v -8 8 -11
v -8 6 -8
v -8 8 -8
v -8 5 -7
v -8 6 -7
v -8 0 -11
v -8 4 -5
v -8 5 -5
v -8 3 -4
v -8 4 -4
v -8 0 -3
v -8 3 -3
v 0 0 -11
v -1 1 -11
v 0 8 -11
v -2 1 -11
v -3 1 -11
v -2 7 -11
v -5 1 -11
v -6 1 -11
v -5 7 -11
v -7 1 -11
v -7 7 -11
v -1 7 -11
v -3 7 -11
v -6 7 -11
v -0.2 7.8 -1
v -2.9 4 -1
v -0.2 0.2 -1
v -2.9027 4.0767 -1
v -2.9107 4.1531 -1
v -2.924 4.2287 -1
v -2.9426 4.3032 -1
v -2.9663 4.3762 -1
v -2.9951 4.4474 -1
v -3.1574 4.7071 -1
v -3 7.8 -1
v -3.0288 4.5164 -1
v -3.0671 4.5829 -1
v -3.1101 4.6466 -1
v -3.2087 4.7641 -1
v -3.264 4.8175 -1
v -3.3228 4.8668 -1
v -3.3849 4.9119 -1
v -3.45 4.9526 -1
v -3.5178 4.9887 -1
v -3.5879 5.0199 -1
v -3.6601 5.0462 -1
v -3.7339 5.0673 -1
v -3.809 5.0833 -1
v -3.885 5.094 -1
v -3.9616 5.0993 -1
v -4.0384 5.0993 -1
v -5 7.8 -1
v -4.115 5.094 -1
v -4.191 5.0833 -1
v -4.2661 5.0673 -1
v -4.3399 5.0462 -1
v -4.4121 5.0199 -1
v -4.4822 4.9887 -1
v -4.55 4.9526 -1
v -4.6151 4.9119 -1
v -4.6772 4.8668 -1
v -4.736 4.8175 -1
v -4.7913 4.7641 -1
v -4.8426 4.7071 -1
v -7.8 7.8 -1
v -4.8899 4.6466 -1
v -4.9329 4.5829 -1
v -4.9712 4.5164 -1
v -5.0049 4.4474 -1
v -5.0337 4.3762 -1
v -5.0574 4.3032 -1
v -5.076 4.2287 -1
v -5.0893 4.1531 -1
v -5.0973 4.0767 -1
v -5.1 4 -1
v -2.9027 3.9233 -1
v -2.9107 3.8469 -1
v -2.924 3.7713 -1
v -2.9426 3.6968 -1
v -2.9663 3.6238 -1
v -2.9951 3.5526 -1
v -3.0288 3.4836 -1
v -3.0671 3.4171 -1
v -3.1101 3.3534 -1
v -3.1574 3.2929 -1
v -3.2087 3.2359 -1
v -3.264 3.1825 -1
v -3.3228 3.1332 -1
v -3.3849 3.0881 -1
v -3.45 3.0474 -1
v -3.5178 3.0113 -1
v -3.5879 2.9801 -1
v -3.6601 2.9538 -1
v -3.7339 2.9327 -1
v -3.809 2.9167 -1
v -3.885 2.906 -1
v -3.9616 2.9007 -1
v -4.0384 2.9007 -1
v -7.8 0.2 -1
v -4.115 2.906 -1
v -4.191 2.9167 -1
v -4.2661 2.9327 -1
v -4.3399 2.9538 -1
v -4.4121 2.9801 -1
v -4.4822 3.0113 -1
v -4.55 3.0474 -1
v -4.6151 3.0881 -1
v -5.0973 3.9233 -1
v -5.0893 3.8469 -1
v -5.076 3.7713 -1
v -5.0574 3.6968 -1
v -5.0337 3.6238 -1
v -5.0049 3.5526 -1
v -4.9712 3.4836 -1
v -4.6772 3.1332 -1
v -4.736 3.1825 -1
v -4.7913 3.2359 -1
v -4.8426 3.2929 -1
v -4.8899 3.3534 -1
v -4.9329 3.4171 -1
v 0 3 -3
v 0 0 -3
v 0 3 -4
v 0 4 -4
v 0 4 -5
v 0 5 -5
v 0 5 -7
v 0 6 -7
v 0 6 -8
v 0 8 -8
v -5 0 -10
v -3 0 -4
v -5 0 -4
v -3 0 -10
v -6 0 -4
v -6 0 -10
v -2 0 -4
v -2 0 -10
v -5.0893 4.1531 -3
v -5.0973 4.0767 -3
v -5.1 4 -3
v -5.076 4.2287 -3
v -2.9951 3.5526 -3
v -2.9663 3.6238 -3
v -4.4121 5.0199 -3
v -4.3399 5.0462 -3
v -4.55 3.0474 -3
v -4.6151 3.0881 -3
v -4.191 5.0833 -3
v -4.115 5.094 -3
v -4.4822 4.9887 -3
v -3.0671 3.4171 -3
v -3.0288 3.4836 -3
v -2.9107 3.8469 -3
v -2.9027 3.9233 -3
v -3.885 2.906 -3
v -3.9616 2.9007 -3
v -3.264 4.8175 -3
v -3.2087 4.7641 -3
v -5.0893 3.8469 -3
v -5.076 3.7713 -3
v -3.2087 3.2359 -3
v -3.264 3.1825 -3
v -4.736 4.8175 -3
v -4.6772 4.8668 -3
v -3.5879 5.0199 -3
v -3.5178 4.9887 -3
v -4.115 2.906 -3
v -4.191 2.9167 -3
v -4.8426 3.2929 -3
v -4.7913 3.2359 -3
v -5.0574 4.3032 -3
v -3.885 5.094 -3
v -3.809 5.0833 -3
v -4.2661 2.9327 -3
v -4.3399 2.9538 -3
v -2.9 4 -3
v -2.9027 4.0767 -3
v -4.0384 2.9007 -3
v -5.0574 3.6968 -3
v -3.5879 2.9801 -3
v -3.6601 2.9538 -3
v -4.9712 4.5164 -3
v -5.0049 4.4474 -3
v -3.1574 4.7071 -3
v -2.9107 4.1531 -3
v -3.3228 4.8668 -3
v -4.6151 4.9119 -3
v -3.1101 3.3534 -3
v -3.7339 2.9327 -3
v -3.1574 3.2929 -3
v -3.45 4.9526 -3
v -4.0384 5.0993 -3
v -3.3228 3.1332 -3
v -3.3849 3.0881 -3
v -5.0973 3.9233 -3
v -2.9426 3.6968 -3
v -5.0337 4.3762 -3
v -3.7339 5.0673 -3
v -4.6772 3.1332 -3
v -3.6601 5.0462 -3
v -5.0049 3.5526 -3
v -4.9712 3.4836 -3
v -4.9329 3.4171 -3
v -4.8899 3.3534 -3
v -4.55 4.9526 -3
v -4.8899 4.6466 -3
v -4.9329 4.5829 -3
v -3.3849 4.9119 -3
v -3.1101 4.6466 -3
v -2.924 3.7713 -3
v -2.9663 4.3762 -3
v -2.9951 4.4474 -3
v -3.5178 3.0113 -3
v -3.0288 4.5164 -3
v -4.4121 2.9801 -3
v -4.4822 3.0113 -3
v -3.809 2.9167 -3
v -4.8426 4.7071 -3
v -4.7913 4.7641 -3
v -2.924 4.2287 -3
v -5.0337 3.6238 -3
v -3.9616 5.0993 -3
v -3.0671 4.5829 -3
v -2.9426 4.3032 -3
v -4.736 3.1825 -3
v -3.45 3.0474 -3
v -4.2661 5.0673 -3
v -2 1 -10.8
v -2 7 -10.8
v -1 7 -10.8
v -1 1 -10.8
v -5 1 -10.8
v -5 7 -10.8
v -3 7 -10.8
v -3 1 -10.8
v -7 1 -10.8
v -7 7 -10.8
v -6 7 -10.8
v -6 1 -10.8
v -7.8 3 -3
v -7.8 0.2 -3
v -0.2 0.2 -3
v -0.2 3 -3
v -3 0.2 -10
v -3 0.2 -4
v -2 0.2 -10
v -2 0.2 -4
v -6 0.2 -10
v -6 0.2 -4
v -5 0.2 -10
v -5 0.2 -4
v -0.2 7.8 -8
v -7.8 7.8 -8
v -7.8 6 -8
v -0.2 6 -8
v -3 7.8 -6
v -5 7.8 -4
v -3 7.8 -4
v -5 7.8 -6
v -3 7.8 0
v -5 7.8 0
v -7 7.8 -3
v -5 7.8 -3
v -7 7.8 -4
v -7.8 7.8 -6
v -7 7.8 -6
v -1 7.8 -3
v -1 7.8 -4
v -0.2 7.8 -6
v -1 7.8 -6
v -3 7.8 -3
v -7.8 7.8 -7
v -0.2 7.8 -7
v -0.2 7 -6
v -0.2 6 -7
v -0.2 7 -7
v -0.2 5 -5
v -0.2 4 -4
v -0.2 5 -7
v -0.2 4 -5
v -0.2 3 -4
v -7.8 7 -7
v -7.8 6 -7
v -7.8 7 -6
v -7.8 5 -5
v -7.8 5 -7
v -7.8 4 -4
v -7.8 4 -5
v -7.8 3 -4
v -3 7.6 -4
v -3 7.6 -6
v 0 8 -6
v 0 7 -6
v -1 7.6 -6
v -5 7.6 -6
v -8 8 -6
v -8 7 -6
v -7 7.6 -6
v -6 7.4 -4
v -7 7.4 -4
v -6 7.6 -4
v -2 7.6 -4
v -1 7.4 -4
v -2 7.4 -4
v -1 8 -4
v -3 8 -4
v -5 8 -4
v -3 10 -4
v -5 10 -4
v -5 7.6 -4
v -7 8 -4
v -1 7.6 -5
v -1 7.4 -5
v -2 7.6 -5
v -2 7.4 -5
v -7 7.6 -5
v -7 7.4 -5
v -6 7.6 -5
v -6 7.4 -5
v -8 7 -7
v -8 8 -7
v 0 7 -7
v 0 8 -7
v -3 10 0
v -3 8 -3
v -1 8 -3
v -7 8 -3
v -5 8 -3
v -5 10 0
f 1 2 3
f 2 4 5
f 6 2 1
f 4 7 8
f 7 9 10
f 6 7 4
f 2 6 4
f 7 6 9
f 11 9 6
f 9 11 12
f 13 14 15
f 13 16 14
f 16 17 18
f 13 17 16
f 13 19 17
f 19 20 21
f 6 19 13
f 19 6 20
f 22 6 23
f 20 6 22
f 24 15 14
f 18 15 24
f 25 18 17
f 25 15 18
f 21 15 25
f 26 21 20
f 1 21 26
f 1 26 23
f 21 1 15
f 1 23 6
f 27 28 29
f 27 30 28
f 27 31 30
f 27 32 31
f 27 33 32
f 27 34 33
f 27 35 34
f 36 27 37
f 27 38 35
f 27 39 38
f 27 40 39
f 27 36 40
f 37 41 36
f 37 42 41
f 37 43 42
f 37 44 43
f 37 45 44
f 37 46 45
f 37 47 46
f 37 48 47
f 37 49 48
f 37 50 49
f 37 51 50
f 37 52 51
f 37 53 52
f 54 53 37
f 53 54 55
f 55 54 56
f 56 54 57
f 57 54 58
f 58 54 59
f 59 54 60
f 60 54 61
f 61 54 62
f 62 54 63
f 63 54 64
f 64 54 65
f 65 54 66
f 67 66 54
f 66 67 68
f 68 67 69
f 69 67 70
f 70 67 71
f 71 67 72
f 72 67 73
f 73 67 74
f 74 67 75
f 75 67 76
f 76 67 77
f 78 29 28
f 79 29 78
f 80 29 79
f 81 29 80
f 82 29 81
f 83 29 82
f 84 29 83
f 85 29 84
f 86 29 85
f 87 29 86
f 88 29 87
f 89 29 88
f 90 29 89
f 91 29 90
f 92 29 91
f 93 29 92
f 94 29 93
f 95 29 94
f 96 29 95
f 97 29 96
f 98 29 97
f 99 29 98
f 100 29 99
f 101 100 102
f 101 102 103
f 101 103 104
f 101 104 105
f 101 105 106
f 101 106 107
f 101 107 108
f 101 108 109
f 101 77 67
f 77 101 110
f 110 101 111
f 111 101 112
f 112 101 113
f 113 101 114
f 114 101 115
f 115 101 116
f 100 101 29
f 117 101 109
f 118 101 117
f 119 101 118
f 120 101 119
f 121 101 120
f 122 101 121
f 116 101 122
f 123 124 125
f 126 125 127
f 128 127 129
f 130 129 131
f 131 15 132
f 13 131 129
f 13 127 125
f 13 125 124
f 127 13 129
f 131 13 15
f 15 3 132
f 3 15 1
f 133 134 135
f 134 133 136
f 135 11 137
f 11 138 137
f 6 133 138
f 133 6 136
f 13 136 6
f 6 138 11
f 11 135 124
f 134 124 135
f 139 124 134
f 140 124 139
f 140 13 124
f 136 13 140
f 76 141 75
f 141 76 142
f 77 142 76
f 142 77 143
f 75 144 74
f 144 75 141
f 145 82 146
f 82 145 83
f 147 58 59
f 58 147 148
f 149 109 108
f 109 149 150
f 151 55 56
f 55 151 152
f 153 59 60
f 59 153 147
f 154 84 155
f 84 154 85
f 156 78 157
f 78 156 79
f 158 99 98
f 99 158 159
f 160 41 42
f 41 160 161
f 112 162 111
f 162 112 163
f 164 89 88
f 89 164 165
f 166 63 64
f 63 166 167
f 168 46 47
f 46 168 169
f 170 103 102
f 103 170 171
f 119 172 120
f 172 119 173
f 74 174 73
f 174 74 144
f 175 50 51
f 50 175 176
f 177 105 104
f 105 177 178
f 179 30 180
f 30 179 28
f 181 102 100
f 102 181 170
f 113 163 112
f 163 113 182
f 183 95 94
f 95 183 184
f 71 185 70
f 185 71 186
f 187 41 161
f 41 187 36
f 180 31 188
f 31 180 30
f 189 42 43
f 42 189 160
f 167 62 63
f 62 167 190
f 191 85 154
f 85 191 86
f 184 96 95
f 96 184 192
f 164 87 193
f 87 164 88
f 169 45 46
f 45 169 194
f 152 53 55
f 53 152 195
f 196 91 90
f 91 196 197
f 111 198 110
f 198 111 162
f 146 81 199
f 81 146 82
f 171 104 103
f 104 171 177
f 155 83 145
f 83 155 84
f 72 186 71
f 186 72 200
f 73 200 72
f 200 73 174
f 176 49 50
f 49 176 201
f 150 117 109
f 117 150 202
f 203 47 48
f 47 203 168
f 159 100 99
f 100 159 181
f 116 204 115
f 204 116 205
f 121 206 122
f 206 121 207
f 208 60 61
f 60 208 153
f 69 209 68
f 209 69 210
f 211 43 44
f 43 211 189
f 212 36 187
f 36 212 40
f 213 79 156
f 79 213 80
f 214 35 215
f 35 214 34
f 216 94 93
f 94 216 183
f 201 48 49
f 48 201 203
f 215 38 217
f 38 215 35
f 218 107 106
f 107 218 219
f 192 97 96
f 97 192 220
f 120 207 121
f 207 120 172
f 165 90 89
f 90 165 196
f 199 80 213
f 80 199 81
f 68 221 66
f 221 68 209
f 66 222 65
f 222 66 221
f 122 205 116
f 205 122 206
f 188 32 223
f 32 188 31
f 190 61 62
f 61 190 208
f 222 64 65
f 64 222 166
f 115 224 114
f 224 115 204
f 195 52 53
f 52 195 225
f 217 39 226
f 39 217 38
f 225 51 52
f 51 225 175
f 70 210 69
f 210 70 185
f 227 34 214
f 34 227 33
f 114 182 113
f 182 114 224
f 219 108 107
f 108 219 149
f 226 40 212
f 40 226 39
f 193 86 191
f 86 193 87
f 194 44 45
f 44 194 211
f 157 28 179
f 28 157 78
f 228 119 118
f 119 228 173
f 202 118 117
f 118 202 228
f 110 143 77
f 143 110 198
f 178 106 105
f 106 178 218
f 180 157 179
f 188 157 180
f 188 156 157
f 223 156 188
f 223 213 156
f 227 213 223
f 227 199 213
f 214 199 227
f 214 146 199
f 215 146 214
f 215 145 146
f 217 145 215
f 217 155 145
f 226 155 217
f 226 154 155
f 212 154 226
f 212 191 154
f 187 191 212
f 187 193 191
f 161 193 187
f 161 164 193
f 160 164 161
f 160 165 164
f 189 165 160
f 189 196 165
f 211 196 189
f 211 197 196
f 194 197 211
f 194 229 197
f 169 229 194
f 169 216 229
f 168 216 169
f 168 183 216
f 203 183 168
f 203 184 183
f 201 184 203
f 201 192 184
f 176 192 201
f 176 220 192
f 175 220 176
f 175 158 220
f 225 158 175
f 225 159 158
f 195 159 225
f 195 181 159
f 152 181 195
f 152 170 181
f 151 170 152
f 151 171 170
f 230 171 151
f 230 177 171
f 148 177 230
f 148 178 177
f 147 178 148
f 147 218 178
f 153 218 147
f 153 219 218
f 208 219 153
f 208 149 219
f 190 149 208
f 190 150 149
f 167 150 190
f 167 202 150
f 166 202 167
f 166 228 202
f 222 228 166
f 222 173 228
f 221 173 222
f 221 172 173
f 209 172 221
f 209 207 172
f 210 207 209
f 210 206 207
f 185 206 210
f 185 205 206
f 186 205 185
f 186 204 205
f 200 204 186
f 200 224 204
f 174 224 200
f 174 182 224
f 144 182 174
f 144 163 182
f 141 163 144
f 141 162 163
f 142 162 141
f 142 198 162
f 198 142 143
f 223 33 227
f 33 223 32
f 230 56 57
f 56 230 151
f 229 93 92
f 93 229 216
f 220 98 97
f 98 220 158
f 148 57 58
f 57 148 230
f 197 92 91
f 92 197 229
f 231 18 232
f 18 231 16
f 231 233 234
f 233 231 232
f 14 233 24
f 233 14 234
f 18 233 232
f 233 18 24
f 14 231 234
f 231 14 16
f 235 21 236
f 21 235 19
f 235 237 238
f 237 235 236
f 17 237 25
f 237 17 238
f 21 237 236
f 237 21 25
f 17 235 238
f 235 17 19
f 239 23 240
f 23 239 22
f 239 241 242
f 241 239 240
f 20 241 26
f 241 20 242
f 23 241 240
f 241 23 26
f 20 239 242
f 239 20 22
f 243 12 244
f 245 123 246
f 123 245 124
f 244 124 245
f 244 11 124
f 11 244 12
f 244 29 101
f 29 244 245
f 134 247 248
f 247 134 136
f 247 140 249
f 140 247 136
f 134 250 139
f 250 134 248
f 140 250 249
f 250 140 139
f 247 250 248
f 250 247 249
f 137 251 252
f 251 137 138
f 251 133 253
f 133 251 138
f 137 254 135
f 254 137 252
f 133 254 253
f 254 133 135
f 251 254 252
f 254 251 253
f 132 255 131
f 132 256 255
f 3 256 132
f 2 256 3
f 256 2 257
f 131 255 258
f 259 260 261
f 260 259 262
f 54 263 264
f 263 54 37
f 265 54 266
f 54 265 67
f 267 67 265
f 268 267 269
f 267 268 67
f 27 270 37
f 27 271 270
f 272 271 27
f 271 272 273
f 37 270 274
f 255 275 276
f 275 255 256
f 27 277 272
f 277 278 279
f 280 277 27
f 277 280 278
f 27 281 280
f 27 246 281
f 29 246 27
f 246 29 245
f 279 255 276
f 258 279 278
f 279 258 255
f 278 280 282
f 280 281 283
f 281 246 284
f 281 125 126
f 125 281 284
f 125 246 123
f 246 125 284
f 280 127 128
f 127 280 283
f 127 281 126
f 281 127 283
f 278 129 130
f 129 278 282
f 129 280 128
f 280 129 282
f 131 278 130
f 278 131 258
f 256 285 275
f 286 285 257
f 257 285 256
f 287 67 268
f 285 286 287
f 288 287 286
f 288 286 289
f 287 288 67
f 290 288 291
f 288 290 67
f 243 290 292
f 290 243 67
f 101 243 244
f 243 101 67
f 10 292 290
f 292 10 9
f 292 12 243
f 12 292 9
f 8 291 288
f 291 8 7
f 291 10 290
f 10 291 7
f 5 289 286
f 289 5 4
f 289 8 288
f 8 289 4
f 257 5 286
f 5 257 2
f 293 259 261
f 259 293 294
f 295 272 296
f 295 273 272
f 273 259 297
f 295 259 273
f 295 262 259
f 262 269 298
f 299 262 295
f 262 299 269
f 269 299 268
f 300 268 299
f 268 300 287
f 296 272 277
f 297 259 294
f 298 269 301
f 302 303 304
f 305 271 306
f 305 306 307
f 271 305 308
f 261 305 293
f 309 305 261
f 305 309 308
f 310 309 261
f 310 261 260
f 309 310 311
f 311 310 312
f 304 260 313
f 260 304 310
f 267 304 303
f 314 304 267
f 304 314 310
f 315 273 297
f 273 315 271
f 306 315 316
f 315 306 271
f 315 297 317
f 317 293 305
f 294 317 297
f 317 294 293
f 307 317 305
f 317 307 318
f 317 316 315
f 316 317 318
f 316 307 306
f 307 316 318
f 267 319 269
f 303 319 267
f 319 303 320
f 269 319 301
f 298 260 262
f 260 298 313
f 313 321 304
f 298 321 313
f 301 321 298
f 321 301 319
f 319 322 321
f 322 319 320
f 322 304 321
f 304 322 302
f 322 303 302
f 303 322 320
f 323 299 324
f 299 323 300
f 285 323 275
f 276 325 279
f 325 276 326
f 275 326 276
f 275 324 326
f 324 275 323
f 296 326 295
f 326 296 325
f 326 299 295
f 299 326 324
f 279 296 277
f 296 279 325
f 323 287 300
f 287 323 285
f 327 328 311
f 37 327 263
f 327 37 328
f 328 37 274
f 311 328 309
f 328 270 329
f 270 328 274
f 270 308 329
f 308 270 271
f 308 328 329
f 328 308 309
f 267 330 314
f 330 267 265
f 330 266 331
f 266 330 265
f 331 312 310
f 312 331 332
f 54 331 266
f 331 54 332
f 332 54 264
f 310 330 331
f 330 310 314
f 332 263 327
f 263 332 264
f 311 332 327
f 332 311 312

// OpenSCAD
//head

$fn=90;

rotate([0,180,0]){

difference(){

translate([0,0,1]){
color("white"){
cube([8,8,10]);
}
}

translate([4,4,0]){
cylinder(r=1.1,h=3);
}

//top
translate([1,1,10.8]){
color("grey"){
cube([1,6,1]);
}
}

translate([3,1,10.8]){
color("grey"){
cube([2,6,1]);
}
}

translate([6,1,10.8]){
color("grey"){
cube([1,6,1]);
}
}

//back
translate([0,-0.8,1]){
color("tan"){
cube([8,1,2]);
}
}

translate([2,-0.8,4]){
color("grey"){
cube([1,1,6]);
}
}

translate([5 ,-0.8,4]){
color("grey"){
cube([1,1,6]);
}
}

//face
translate([0,7.8,1]){
color("tan"){
cube([8,1,7]);
}
}

//right side
translate([-0.8,0,1]){
color("tan"){
cube([1,8,2]);
}
}

translate([-0.8,3,3]){
color("tan"){
cube([1,5,1]);
}
}

translate([-0.8,4,4]){
color("tan"){
cube([1,4,1]);
}
}

translate([-0.8,5,5]){
color("tan"){
cube([1,3,2]);
}
}

translate([-0.8,6,7]){
color("tan"){
cube([1,2,1]);
}
}

//left side
translate([7.8,0,1]){
color("tan"){
cube([1,8,2]);
}
}

translate([7.8,3,3]){
color("tan"){
cube([1,5,1]);
}
}

translate([7.8,4,4]){
color("tan"){
cube([1,4,1]);
}
}

translate([7.8,5,5]){
color("tan"){
cube([1,3,2]);
}
}

translate([7.8,6,7]){
color("tan"){
cube([1,2,1]);
}
}

//eyes
translate([1,7.6,4]){
color("black"){
cube([2,1,2]);
}
}

translate([1,7.4,4]){
color("red"){
cube([1,1,1]);
}
}

translate([5,7.6,4]){
color("black"){
cube([2,1,2]);
}
}

translate([6,7.4,4]){
color("red"){
cube([1,1,1]);
}
}

}

//eyebrow
translate([0,7,6]){
color("saddlebrown"){
cube([8,1,1]);
}
}

//eyelids
translate([1,7,3]){
color("grey"){
cube([2,1,1]);
}
}

translate([5,7,3]){
color("grey"){
cube([2,1,1]);
}
}

//nose
translate([3,7.8,0]){
color("saddlebrown"){
cube([2,2.2,4]);
}
}

}
